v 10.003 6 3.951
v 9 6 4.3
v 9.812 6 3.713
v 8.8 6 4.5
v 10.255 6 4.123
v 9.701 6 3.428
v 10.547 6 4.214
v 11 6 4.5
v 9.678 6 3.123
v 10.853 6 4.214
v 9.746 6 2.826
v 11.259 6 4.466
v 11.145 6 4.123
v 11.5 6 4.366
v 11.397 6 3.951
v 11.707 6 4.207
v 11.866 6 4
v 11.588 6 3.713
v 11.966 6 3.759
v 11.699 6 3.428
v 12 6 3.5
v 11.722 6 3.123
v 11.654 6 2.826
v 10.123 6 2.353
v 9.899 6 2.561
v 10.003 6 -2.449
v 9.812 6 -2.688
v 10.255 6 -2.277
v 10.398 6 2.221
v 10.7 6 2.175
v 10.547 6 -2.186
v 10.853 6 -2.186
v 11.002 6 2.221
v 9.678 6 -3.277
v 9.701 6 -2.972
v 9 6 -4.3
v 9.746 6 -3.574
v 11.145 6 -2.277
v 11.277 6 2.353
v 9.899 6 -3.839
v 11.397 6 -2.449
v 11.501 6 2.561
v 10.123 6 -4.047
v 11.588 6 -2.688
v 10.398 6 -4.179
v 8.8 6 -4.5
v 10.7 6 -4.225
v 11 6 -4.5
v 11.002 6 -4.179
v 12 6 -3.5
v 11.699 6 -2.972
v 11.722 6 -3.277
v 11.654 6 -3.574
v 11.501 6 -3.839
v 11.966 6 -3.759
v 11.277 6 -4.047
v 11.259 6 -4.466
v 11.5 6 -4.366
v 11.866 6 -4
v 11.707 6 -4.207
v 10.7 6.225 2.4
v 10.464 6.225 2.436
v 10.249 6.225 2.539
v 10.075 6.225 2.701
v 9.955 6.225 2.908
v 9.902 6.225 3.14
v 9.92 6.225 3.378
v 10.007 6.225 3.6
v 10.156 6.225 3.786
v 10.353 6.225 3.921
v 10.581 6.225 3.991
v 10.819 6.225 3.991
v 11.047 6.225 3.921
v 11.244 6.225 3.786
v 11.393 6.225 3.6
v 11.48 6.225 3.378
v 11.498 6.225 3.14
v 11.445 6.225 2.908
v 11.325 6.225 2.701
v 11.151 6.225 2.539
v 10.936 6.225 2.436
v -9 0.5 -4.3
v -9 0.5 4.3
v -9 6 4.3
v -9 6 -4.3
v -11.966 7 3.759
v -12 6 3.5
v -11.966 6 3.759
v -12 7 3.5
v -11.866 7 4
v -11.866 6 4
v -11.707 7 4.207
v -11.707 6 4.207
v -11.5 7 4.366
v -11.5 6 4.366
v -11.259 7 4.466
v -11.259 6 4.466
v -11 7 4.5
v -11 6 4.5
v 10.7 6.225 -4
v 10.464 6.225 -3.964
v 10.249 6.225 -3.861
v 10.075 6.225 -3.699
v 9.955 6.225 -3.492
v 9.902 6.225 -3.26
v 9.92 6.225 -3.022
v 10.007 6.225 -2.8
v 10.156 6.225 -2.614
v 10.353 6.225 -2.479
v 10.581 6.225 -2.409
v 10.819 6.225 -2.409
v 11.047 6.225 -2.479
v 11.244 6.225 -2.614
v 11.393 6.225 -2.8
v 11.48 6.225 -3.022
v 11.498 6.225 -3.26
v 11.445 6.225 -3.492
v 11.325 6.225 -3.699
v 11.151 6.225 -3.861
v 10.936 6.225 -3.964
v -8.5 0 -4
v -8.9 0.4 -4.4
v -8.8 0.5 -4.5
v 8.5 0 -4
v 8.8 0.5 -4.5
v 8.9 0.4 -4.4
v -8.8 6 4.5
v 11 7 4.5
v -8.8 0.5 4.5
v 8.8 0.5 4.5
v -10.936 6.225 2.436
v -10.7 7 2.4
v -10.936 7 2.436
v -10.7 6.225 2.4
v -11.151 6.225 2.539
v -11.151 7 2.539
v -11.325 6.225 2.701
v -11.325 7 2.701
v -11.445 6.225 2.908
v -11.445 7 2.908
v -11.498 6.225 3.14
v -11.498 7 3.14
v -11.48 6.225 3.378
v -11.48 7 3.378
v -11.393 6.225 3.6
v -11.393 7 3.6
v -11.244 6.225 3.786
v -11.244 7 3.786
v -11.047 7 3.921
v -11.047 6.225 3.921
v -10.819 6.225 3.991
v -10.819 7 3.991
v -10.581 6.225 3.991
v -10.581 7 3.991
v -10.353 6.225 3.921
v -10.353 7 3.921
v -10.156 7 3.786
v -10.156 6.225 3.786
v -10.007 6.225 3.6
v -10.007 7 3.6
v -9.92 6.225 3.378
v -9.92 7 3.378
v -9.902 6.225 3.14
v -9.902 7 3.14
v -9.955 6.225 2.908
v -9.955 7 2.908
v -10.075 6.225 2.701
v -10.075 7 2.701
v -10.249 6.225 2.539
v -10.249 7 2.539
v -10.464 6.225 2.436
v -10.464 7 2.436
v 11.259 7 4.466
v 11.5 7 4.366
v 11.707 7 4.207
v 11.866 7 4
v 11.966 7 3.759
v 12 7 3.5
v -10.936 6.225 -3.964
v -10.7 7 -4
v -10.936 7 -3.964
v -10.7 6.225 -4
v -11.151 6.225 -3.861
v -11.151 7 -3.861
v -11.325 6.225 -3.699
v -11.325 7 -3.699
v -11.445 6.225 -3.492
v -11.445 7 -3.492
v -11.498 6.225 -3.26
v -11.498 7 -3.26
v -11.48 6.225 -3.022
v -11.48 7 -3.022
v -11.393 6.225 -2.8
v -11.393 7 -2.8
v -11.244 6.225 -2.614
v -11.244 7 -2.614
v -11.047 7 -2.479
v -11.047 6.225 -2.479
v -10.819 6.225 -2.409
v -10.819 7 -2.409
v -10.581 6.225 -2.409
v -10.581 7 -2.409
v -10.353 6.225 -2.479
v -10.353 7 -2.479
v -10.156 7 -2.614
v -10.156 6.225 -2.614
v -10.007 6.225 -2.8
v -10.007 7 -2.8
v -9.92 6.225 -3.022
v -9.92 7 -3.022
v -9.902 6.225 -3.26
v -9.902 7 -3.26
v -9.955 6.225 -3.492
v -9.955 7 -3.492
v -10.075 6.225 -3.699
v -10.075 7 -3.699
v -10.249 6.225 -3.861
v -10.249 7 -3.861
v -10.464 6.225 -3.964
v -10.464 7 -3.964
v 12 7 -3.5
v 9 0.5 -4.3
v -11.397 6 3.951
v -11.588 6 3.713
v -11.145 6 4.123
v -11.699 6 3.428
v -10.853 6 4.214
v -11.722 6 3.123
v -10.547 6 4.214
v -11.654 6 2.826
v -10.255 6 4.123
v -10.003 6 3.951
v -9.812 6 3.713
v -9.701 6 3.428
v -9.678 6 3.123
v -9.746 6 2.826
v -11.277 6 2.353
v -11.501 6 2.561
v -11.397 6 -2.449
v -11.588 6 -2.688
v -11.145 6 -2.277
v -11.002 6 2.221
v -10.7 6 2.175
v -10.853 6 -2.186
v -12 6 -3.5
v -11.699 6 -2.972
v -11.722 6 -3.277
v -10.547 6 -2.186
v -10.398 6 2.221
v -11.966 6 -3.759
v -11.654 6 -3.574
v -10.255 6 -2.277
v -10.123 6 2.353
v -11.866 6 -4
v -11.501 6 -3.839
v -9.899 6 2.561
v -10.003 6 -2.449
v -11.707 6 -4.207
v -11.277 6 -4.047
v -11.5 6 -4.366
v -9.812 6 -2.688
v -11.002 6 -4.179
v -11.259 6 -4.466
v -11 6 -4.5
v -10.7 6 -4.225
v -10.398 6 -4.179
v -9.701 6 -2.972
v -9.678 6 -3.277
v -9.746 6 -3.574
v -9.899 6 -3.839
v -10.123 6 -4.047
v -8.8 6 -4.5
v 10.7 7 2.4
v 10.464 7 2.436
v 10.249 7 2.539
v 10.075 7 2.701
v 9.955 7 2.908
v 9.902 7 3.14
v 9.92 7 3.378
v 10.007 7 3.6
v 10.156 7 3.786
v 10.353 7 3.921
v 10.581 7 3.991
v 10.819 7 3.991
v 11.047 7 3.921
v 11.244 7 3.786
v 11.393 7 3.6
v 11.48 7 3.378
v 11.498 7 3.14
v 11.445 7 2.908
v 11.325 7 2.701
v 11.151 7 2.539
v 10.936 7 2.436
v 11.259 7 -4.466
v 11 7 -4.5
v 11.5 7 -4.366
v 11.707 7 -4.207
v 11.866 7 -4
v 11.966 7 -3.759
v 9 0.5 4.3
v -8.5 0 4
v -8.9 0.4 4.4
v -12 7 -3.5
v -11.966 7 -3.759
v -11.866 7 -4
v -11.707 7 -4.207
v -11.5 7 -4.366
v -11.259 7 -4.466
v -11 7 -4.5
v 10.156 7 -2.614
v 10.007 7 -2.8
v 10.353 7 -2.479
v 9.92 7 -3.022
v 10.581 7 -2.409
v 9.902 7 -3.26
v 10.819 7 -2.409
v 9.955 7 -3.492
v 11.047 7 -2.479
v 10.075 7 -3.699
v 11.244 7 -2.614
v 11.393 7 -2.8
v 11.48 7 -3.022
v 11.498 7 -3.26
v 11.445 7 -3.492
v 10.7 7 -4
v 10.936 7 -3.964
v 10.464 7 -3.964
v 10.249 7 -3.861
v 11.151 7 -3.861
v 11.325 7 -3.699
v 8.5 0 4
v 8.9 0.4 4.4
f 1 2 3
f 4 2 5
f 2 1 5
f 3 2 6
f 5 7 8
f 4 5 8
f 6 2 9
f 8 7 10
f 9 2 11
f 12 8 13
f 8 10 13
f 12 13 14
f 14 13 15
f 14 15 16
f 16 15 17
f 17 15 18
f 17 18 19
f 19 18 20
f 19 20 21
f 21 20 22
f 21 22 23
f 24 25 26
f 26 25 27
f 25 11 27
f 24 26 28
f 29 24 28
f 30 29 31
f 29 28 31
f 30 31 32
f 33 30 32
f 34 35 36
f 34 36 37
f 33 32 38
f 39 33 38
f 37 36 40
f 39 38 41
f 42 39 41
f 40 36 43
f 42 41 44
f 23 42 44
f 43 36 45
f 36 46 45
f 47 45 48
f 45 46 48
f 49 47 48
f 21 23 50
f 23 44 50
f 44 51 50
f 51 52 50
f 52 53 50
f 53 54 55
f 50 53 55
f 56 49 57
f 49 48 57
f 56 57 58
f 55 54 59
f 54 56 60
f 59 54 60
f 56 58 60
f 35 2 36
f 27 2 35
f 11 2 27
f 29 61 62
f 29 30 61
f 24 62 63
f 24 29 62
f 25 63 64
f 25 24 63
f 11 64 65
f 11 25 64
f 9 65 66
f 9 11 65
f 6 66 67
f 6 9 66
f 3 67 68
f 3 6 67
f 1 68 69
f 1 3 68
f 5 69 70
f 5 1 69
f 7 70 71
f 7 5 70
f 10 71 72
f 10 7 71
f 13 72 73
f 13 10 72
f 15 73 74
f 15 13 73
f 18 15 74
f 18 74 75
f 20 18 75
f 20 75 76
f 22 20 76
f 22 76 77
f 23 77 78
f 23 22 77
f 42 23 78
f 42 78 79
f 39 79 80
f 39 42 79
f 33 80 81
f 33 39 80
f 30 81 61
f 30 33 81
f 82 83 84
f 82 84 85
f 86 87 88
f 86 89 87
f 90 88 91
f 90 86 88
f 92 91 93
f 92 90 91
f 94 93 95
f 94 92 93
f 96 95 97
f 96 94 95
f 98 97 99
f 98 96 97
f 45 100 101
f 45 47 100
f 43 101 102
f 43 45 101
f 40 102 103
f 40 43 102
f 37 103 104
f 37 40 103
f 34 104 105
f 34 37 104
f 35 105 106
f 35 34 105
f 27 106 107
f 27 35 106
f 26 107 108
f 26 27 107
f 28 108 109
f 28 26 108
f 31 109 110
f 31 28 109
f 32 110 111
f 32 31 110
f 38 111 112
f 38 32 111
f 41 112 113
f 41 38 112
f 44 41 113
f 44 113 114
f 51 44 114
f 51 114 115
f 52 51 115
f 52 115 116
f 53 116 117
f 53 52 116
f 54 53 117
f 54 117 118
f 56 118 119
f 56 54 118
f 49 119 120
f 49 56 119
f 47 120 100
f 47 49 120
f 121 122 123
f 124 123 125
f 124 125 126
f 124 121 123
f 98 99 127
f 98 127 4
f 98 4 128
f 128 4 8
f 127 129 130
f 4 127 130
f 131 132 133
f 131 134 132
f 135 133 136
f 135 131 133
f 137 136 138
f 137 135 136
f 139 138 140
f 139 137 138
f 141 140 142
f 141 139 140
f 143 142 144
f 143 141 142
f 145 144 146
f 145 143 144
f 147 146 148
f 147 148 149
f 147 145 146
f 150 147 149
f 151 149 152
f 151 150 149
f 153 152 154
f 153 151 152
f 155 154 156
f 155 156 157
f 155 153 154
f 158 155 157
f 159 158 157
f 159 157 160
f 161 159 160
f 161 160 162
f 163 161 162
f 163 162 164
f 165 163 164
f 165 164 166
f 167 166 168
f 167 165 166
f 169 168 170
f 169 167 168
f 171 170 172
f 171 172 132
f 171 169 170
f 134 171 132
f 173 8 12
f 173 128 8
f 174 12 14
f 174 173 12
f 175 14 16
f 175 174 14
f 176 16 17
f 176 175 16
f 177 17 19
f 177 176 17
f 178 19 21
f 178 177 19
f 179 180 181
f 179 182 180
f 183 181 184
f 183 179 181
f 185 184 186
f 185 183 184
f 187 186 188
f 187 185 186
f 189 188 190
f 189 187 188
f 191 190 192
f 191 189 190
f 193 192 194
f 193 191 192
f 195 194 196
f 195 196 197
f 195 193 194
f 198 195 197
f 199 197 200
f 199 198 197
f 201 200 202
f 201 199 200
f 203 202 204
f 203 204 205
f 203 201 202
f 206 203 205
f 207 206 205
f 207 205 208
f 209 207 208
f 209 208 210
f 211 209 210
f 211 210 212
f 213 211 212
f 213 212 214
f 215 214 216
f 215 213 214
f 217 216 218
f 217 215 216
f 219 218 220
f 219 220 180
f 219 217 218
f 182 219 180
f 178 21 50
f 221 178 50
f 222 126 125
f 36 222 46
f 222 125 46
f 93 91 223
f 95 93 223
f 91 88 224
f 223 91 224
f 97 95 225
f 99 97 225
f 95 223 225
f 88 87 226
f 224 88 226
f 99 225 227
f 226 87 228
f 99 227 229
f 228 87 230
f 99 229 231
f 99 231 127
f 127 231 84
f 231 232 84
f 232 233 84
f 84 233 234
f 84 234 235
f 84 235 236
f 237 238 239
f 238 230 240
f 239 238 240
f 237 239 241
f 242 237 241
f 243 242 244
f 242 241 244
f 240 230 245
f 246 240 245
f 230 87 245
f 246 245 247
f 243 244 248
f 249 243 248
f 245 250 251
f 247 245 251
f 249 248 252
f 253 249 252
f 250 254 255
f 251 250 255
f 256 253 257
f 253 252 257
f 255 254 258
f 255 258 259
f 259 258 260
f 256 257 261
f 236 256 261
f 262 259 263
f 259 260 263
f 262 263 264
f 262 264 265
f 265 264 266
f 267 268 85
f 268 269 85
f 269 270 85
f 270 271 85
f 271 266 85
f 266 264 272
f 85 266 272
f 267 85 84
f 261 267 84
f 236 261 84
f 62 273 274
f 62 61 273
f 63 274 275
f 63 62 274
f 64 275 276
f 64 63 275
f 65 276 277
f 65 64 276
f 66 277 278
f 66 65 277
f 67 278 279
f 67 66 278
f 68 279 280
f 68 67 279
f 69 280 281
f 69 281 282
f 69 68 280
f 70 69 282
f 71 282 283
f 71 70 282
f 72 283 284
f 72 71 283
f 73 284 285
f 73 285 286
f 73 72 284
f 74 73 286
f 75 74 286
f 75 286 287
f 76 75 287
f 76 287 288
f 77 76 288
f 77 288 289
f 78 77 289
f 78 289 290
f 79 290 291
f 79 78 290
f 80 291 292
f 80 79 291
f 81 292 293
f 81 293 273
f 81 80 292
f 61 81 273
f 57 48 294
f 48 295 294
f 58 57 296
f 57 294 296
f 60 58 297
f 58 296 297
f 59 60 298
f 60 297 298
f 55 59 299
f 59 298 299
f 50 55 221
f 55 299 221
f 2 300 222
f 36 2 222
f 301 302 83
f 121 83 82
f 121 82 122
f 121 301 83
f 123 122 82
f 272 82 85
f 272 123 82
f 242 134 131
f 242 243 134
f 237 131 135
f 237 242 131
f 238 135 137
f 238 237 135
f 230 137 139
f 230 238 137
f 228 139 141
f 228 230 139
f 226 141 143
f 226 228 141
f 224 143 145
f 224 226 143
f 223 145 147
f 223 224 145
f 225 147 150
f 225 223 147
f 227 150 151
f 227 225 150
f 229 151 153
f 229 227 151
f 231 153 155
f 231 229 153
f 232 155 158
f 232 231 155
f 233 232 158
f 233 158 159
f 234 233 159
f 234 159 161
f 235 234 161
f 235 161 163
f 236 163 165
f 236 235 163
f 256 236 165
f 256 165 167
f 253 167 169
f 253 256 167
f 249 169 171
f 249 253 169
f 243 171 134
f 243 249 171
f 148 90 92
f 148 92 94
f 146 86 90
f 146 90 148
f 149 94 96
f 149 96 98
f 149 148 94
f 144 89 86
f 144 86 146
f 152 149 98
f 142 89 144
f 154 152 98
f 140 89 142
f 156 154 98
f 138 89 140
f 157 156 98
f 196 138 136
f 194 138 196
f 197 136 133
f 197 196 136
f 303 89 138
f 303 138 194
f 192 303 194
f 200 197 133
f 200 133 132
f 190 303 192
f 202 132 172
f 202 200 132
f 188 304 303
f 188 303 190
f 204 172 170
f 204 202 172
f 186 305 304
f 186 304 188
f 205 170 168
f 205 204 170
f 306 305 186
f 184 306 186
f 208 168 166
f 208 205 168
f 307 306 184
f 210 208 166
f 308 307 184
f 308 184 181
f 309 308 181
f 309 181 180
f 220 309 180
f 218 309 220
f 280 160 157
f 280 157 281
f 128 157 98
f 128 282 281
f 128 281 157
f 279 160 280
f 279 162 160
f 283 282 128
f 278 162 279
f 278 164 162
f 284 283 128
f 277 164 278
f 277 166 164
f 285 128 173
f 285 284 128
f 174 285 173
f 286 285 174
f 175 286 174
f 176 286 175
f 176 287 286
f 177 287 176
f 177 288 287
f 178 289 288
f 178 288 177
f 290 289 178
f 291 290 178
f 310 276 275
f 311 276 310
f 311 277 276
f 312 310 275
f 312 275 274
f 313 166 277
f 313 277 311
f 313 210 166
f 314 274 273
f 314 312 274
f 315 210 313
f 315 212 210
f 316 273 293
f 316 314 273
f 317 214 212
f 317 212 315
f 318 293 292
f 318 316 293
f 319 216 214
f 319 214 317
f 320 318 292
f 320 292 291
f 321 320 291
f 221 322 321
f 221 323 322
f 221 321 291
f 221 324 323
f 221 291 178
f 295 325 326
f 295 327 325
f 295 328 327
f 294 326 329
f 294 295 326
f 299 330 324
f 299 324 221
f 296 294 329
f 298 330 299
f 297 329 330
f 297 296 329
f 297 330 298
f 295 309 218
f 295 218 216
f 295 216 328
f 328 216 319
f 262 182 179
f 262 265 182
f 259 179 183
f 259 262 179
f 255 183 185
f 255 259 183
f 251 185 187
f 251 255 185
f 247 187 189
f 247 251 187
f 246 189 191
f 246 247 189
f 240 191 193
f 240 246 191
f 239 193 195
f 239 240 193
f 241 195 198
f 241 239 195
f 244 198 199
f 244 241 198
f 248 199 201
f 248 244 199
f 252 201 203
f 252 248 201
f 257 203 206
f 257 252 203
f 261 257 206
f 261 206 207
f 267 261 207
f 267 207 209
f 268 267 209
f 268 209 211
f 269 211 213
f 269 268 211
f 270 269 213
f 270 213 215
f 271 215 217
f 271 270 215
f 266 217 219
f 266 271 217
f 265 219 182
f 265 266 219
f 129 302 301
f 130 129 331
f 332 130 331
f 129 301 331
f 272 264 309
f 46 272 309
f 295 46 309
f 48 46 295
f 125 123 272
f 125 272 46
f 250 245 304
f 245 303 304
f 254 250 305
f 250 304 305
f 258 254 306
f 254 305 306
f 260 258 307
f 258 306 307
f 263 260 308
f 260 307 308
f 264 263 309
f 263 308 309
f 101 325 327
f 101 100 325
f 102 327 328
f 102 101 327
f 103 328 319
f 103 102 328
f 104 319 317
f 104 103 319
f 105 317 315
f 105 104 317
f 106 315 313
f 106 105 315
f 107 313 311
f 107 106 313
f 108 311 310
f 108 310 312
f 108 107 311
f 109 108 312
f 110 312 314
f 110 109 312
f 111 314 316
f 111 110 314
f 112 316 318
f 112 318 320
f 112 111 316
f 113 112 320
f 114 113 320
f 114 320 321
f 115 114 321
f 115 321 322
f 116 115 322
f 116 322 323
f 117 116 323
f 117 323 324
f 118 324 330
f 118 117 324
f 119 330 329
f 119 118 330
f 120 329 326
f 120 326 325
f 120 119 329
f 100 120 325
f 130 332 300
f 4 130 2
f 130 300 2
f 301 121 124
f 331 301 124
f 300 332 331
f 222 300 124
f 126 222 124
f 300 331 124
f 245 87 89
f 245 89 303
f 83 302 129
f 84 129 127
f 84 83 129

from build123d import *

# Parameters (mm, degrees)
SKETCH_1_W                  = 18
SKETCH_1_H                  = 9
EXTRUDE_1_DEPTH             = 6
SKETCH_2_W                  = 24
SKETCH_2_H                  = 9
EXTRUDE_2_DEPTH             = 1
FILLET_1_R                  = 1
CHAMFER_1_SIZE              = 0.5
CHAMFER_2_SIZE              = 0.2
HOLE_WIZARD_M2_1_AT_2_COUNT = 2
HOLE_WIZARD_M2_1_AT_2_PITCH = 6.4
HOLE_WIZARD_M2_1_AT_3_COUNT = 2
HOLE_WIZARD_M2_1_AT_3_PITCH = 22.336517186
HOLE_WIZARD_M2_1_AT_4_COUNT = 2
HOLE_WIZARD_M2_1_AT_4_PITCH = 21.4


with BuildPart() as part:
    # 草图1 → 凸台-拉伸1 (new body)
    with BuildSketch(Plane(origin=(0, 0, 0), x_dir=(1, 0, 0), z_dir=(0, 1, 0))):
        Rectangle(SKETCH_1_W, SKETCH_1_H)
    extrude(amount=EXTRUDE_1_DEPTH)

    # 草图2 → 凸台-拉伸2 (add)
    with BuildSketch(Plane(origin=(0, 6, 0), x_dir=(1, 0, 0), z_dir=(0, 1, 0))):
        Rectangle(SKETCH_2_W, SKETCH_2_H)
    extrude(amount=EXTRUDE_2_DEPTH)

    # 圆角1
    fillet_1_edges = [part.edges().sort_by_distance(p)[0] for p in [
        (-12, 6.5, -4.5),
        (-12, 6.5, 4.5),
        (12, 6.5, 4.5),
        (12, 6.5, -4.5),
    ]]
    fillet(fillet_1_edges, radius=FILLET_1_R)

    # 倒角1
    chamfer_1_edges = [part.edges().sort_by_distance(p)[0] for p in [
        (0, 0, -4.5),
        (9, 0, 0),
        (0, 0, 4.5),
        (-9, 0, 0),
    ]]
    chamfer(chamfer_1_edges, length=CHAMFER_1_SIZE)

    # 倒角2
    chamfer_2_edges = [part.edges().sort_by_distance(p)[0] for p in [
        (-9, 3.25, -4.5),
        (9, 3.25, -4.5),
        (9, 3.25, 4.5),
        (-9, 3.25, 4.5),
    ]]
    chamfer(chamfer_2_edges, length=CHAMFER_2_SIZE)

    # 草图5 → M2 螺纹孔1 (revolve, cut)
    with BuildSketch(Plane(origin=(-10.7, 6, -3.2), x_dir=(0, 0, -1), z_dir=(1, 0, 0))):
        Polygon((0, 0), (0, 1), (0.8, 1), (0.8, 0.225), (1.025, 0), align=None)
    hole_wizard_m2_1 = revolve(axis=Axis((-10.7, -0.35, -3.2), (0, 1, 0)), mode=Mode.SUBTRACT)

    # M2 螺纹孔1 at 2: M2 螺纹孔1 ×2
    with Locations(*[(0, 0, i * HOLE_WIZARD_M2_1_AT_2_PITCH) for i in range(1, HOLE_WIZARD_M2_1_AT_2_COUNT)]):
        add(hole_wizard_m2_1, mode=Mode.SUBTRACT)

    # M2 螺纹孔1 at 3: M2 螺纹孔1 ×2
    with Locations(*[Vector(0.958072371883615, 0, 0.2865263168250065) * (i * HOLE_WIZARD_M2_1_AT_3_PITCH) for i in range(1, HOLE_WIZARD_M2_1_AT_3_COUNT)]):
        add(hole_wizard_m2_1, mode=Mode.SUBTRACT)

    # M2 螺纹孔1 at 4: M2 螺纹孔1 ×2
    with Locations(*[(i * HOLE_WIZARD_M2_1_AT_4_PITCH, 0, 0) for i in range(1, HOLE_WIZARD_M2_1_AT_4_COUNT)]):
        add(hole_wizard_m2_1, mode=Mode.SUBTRACT)


solid = part.part
